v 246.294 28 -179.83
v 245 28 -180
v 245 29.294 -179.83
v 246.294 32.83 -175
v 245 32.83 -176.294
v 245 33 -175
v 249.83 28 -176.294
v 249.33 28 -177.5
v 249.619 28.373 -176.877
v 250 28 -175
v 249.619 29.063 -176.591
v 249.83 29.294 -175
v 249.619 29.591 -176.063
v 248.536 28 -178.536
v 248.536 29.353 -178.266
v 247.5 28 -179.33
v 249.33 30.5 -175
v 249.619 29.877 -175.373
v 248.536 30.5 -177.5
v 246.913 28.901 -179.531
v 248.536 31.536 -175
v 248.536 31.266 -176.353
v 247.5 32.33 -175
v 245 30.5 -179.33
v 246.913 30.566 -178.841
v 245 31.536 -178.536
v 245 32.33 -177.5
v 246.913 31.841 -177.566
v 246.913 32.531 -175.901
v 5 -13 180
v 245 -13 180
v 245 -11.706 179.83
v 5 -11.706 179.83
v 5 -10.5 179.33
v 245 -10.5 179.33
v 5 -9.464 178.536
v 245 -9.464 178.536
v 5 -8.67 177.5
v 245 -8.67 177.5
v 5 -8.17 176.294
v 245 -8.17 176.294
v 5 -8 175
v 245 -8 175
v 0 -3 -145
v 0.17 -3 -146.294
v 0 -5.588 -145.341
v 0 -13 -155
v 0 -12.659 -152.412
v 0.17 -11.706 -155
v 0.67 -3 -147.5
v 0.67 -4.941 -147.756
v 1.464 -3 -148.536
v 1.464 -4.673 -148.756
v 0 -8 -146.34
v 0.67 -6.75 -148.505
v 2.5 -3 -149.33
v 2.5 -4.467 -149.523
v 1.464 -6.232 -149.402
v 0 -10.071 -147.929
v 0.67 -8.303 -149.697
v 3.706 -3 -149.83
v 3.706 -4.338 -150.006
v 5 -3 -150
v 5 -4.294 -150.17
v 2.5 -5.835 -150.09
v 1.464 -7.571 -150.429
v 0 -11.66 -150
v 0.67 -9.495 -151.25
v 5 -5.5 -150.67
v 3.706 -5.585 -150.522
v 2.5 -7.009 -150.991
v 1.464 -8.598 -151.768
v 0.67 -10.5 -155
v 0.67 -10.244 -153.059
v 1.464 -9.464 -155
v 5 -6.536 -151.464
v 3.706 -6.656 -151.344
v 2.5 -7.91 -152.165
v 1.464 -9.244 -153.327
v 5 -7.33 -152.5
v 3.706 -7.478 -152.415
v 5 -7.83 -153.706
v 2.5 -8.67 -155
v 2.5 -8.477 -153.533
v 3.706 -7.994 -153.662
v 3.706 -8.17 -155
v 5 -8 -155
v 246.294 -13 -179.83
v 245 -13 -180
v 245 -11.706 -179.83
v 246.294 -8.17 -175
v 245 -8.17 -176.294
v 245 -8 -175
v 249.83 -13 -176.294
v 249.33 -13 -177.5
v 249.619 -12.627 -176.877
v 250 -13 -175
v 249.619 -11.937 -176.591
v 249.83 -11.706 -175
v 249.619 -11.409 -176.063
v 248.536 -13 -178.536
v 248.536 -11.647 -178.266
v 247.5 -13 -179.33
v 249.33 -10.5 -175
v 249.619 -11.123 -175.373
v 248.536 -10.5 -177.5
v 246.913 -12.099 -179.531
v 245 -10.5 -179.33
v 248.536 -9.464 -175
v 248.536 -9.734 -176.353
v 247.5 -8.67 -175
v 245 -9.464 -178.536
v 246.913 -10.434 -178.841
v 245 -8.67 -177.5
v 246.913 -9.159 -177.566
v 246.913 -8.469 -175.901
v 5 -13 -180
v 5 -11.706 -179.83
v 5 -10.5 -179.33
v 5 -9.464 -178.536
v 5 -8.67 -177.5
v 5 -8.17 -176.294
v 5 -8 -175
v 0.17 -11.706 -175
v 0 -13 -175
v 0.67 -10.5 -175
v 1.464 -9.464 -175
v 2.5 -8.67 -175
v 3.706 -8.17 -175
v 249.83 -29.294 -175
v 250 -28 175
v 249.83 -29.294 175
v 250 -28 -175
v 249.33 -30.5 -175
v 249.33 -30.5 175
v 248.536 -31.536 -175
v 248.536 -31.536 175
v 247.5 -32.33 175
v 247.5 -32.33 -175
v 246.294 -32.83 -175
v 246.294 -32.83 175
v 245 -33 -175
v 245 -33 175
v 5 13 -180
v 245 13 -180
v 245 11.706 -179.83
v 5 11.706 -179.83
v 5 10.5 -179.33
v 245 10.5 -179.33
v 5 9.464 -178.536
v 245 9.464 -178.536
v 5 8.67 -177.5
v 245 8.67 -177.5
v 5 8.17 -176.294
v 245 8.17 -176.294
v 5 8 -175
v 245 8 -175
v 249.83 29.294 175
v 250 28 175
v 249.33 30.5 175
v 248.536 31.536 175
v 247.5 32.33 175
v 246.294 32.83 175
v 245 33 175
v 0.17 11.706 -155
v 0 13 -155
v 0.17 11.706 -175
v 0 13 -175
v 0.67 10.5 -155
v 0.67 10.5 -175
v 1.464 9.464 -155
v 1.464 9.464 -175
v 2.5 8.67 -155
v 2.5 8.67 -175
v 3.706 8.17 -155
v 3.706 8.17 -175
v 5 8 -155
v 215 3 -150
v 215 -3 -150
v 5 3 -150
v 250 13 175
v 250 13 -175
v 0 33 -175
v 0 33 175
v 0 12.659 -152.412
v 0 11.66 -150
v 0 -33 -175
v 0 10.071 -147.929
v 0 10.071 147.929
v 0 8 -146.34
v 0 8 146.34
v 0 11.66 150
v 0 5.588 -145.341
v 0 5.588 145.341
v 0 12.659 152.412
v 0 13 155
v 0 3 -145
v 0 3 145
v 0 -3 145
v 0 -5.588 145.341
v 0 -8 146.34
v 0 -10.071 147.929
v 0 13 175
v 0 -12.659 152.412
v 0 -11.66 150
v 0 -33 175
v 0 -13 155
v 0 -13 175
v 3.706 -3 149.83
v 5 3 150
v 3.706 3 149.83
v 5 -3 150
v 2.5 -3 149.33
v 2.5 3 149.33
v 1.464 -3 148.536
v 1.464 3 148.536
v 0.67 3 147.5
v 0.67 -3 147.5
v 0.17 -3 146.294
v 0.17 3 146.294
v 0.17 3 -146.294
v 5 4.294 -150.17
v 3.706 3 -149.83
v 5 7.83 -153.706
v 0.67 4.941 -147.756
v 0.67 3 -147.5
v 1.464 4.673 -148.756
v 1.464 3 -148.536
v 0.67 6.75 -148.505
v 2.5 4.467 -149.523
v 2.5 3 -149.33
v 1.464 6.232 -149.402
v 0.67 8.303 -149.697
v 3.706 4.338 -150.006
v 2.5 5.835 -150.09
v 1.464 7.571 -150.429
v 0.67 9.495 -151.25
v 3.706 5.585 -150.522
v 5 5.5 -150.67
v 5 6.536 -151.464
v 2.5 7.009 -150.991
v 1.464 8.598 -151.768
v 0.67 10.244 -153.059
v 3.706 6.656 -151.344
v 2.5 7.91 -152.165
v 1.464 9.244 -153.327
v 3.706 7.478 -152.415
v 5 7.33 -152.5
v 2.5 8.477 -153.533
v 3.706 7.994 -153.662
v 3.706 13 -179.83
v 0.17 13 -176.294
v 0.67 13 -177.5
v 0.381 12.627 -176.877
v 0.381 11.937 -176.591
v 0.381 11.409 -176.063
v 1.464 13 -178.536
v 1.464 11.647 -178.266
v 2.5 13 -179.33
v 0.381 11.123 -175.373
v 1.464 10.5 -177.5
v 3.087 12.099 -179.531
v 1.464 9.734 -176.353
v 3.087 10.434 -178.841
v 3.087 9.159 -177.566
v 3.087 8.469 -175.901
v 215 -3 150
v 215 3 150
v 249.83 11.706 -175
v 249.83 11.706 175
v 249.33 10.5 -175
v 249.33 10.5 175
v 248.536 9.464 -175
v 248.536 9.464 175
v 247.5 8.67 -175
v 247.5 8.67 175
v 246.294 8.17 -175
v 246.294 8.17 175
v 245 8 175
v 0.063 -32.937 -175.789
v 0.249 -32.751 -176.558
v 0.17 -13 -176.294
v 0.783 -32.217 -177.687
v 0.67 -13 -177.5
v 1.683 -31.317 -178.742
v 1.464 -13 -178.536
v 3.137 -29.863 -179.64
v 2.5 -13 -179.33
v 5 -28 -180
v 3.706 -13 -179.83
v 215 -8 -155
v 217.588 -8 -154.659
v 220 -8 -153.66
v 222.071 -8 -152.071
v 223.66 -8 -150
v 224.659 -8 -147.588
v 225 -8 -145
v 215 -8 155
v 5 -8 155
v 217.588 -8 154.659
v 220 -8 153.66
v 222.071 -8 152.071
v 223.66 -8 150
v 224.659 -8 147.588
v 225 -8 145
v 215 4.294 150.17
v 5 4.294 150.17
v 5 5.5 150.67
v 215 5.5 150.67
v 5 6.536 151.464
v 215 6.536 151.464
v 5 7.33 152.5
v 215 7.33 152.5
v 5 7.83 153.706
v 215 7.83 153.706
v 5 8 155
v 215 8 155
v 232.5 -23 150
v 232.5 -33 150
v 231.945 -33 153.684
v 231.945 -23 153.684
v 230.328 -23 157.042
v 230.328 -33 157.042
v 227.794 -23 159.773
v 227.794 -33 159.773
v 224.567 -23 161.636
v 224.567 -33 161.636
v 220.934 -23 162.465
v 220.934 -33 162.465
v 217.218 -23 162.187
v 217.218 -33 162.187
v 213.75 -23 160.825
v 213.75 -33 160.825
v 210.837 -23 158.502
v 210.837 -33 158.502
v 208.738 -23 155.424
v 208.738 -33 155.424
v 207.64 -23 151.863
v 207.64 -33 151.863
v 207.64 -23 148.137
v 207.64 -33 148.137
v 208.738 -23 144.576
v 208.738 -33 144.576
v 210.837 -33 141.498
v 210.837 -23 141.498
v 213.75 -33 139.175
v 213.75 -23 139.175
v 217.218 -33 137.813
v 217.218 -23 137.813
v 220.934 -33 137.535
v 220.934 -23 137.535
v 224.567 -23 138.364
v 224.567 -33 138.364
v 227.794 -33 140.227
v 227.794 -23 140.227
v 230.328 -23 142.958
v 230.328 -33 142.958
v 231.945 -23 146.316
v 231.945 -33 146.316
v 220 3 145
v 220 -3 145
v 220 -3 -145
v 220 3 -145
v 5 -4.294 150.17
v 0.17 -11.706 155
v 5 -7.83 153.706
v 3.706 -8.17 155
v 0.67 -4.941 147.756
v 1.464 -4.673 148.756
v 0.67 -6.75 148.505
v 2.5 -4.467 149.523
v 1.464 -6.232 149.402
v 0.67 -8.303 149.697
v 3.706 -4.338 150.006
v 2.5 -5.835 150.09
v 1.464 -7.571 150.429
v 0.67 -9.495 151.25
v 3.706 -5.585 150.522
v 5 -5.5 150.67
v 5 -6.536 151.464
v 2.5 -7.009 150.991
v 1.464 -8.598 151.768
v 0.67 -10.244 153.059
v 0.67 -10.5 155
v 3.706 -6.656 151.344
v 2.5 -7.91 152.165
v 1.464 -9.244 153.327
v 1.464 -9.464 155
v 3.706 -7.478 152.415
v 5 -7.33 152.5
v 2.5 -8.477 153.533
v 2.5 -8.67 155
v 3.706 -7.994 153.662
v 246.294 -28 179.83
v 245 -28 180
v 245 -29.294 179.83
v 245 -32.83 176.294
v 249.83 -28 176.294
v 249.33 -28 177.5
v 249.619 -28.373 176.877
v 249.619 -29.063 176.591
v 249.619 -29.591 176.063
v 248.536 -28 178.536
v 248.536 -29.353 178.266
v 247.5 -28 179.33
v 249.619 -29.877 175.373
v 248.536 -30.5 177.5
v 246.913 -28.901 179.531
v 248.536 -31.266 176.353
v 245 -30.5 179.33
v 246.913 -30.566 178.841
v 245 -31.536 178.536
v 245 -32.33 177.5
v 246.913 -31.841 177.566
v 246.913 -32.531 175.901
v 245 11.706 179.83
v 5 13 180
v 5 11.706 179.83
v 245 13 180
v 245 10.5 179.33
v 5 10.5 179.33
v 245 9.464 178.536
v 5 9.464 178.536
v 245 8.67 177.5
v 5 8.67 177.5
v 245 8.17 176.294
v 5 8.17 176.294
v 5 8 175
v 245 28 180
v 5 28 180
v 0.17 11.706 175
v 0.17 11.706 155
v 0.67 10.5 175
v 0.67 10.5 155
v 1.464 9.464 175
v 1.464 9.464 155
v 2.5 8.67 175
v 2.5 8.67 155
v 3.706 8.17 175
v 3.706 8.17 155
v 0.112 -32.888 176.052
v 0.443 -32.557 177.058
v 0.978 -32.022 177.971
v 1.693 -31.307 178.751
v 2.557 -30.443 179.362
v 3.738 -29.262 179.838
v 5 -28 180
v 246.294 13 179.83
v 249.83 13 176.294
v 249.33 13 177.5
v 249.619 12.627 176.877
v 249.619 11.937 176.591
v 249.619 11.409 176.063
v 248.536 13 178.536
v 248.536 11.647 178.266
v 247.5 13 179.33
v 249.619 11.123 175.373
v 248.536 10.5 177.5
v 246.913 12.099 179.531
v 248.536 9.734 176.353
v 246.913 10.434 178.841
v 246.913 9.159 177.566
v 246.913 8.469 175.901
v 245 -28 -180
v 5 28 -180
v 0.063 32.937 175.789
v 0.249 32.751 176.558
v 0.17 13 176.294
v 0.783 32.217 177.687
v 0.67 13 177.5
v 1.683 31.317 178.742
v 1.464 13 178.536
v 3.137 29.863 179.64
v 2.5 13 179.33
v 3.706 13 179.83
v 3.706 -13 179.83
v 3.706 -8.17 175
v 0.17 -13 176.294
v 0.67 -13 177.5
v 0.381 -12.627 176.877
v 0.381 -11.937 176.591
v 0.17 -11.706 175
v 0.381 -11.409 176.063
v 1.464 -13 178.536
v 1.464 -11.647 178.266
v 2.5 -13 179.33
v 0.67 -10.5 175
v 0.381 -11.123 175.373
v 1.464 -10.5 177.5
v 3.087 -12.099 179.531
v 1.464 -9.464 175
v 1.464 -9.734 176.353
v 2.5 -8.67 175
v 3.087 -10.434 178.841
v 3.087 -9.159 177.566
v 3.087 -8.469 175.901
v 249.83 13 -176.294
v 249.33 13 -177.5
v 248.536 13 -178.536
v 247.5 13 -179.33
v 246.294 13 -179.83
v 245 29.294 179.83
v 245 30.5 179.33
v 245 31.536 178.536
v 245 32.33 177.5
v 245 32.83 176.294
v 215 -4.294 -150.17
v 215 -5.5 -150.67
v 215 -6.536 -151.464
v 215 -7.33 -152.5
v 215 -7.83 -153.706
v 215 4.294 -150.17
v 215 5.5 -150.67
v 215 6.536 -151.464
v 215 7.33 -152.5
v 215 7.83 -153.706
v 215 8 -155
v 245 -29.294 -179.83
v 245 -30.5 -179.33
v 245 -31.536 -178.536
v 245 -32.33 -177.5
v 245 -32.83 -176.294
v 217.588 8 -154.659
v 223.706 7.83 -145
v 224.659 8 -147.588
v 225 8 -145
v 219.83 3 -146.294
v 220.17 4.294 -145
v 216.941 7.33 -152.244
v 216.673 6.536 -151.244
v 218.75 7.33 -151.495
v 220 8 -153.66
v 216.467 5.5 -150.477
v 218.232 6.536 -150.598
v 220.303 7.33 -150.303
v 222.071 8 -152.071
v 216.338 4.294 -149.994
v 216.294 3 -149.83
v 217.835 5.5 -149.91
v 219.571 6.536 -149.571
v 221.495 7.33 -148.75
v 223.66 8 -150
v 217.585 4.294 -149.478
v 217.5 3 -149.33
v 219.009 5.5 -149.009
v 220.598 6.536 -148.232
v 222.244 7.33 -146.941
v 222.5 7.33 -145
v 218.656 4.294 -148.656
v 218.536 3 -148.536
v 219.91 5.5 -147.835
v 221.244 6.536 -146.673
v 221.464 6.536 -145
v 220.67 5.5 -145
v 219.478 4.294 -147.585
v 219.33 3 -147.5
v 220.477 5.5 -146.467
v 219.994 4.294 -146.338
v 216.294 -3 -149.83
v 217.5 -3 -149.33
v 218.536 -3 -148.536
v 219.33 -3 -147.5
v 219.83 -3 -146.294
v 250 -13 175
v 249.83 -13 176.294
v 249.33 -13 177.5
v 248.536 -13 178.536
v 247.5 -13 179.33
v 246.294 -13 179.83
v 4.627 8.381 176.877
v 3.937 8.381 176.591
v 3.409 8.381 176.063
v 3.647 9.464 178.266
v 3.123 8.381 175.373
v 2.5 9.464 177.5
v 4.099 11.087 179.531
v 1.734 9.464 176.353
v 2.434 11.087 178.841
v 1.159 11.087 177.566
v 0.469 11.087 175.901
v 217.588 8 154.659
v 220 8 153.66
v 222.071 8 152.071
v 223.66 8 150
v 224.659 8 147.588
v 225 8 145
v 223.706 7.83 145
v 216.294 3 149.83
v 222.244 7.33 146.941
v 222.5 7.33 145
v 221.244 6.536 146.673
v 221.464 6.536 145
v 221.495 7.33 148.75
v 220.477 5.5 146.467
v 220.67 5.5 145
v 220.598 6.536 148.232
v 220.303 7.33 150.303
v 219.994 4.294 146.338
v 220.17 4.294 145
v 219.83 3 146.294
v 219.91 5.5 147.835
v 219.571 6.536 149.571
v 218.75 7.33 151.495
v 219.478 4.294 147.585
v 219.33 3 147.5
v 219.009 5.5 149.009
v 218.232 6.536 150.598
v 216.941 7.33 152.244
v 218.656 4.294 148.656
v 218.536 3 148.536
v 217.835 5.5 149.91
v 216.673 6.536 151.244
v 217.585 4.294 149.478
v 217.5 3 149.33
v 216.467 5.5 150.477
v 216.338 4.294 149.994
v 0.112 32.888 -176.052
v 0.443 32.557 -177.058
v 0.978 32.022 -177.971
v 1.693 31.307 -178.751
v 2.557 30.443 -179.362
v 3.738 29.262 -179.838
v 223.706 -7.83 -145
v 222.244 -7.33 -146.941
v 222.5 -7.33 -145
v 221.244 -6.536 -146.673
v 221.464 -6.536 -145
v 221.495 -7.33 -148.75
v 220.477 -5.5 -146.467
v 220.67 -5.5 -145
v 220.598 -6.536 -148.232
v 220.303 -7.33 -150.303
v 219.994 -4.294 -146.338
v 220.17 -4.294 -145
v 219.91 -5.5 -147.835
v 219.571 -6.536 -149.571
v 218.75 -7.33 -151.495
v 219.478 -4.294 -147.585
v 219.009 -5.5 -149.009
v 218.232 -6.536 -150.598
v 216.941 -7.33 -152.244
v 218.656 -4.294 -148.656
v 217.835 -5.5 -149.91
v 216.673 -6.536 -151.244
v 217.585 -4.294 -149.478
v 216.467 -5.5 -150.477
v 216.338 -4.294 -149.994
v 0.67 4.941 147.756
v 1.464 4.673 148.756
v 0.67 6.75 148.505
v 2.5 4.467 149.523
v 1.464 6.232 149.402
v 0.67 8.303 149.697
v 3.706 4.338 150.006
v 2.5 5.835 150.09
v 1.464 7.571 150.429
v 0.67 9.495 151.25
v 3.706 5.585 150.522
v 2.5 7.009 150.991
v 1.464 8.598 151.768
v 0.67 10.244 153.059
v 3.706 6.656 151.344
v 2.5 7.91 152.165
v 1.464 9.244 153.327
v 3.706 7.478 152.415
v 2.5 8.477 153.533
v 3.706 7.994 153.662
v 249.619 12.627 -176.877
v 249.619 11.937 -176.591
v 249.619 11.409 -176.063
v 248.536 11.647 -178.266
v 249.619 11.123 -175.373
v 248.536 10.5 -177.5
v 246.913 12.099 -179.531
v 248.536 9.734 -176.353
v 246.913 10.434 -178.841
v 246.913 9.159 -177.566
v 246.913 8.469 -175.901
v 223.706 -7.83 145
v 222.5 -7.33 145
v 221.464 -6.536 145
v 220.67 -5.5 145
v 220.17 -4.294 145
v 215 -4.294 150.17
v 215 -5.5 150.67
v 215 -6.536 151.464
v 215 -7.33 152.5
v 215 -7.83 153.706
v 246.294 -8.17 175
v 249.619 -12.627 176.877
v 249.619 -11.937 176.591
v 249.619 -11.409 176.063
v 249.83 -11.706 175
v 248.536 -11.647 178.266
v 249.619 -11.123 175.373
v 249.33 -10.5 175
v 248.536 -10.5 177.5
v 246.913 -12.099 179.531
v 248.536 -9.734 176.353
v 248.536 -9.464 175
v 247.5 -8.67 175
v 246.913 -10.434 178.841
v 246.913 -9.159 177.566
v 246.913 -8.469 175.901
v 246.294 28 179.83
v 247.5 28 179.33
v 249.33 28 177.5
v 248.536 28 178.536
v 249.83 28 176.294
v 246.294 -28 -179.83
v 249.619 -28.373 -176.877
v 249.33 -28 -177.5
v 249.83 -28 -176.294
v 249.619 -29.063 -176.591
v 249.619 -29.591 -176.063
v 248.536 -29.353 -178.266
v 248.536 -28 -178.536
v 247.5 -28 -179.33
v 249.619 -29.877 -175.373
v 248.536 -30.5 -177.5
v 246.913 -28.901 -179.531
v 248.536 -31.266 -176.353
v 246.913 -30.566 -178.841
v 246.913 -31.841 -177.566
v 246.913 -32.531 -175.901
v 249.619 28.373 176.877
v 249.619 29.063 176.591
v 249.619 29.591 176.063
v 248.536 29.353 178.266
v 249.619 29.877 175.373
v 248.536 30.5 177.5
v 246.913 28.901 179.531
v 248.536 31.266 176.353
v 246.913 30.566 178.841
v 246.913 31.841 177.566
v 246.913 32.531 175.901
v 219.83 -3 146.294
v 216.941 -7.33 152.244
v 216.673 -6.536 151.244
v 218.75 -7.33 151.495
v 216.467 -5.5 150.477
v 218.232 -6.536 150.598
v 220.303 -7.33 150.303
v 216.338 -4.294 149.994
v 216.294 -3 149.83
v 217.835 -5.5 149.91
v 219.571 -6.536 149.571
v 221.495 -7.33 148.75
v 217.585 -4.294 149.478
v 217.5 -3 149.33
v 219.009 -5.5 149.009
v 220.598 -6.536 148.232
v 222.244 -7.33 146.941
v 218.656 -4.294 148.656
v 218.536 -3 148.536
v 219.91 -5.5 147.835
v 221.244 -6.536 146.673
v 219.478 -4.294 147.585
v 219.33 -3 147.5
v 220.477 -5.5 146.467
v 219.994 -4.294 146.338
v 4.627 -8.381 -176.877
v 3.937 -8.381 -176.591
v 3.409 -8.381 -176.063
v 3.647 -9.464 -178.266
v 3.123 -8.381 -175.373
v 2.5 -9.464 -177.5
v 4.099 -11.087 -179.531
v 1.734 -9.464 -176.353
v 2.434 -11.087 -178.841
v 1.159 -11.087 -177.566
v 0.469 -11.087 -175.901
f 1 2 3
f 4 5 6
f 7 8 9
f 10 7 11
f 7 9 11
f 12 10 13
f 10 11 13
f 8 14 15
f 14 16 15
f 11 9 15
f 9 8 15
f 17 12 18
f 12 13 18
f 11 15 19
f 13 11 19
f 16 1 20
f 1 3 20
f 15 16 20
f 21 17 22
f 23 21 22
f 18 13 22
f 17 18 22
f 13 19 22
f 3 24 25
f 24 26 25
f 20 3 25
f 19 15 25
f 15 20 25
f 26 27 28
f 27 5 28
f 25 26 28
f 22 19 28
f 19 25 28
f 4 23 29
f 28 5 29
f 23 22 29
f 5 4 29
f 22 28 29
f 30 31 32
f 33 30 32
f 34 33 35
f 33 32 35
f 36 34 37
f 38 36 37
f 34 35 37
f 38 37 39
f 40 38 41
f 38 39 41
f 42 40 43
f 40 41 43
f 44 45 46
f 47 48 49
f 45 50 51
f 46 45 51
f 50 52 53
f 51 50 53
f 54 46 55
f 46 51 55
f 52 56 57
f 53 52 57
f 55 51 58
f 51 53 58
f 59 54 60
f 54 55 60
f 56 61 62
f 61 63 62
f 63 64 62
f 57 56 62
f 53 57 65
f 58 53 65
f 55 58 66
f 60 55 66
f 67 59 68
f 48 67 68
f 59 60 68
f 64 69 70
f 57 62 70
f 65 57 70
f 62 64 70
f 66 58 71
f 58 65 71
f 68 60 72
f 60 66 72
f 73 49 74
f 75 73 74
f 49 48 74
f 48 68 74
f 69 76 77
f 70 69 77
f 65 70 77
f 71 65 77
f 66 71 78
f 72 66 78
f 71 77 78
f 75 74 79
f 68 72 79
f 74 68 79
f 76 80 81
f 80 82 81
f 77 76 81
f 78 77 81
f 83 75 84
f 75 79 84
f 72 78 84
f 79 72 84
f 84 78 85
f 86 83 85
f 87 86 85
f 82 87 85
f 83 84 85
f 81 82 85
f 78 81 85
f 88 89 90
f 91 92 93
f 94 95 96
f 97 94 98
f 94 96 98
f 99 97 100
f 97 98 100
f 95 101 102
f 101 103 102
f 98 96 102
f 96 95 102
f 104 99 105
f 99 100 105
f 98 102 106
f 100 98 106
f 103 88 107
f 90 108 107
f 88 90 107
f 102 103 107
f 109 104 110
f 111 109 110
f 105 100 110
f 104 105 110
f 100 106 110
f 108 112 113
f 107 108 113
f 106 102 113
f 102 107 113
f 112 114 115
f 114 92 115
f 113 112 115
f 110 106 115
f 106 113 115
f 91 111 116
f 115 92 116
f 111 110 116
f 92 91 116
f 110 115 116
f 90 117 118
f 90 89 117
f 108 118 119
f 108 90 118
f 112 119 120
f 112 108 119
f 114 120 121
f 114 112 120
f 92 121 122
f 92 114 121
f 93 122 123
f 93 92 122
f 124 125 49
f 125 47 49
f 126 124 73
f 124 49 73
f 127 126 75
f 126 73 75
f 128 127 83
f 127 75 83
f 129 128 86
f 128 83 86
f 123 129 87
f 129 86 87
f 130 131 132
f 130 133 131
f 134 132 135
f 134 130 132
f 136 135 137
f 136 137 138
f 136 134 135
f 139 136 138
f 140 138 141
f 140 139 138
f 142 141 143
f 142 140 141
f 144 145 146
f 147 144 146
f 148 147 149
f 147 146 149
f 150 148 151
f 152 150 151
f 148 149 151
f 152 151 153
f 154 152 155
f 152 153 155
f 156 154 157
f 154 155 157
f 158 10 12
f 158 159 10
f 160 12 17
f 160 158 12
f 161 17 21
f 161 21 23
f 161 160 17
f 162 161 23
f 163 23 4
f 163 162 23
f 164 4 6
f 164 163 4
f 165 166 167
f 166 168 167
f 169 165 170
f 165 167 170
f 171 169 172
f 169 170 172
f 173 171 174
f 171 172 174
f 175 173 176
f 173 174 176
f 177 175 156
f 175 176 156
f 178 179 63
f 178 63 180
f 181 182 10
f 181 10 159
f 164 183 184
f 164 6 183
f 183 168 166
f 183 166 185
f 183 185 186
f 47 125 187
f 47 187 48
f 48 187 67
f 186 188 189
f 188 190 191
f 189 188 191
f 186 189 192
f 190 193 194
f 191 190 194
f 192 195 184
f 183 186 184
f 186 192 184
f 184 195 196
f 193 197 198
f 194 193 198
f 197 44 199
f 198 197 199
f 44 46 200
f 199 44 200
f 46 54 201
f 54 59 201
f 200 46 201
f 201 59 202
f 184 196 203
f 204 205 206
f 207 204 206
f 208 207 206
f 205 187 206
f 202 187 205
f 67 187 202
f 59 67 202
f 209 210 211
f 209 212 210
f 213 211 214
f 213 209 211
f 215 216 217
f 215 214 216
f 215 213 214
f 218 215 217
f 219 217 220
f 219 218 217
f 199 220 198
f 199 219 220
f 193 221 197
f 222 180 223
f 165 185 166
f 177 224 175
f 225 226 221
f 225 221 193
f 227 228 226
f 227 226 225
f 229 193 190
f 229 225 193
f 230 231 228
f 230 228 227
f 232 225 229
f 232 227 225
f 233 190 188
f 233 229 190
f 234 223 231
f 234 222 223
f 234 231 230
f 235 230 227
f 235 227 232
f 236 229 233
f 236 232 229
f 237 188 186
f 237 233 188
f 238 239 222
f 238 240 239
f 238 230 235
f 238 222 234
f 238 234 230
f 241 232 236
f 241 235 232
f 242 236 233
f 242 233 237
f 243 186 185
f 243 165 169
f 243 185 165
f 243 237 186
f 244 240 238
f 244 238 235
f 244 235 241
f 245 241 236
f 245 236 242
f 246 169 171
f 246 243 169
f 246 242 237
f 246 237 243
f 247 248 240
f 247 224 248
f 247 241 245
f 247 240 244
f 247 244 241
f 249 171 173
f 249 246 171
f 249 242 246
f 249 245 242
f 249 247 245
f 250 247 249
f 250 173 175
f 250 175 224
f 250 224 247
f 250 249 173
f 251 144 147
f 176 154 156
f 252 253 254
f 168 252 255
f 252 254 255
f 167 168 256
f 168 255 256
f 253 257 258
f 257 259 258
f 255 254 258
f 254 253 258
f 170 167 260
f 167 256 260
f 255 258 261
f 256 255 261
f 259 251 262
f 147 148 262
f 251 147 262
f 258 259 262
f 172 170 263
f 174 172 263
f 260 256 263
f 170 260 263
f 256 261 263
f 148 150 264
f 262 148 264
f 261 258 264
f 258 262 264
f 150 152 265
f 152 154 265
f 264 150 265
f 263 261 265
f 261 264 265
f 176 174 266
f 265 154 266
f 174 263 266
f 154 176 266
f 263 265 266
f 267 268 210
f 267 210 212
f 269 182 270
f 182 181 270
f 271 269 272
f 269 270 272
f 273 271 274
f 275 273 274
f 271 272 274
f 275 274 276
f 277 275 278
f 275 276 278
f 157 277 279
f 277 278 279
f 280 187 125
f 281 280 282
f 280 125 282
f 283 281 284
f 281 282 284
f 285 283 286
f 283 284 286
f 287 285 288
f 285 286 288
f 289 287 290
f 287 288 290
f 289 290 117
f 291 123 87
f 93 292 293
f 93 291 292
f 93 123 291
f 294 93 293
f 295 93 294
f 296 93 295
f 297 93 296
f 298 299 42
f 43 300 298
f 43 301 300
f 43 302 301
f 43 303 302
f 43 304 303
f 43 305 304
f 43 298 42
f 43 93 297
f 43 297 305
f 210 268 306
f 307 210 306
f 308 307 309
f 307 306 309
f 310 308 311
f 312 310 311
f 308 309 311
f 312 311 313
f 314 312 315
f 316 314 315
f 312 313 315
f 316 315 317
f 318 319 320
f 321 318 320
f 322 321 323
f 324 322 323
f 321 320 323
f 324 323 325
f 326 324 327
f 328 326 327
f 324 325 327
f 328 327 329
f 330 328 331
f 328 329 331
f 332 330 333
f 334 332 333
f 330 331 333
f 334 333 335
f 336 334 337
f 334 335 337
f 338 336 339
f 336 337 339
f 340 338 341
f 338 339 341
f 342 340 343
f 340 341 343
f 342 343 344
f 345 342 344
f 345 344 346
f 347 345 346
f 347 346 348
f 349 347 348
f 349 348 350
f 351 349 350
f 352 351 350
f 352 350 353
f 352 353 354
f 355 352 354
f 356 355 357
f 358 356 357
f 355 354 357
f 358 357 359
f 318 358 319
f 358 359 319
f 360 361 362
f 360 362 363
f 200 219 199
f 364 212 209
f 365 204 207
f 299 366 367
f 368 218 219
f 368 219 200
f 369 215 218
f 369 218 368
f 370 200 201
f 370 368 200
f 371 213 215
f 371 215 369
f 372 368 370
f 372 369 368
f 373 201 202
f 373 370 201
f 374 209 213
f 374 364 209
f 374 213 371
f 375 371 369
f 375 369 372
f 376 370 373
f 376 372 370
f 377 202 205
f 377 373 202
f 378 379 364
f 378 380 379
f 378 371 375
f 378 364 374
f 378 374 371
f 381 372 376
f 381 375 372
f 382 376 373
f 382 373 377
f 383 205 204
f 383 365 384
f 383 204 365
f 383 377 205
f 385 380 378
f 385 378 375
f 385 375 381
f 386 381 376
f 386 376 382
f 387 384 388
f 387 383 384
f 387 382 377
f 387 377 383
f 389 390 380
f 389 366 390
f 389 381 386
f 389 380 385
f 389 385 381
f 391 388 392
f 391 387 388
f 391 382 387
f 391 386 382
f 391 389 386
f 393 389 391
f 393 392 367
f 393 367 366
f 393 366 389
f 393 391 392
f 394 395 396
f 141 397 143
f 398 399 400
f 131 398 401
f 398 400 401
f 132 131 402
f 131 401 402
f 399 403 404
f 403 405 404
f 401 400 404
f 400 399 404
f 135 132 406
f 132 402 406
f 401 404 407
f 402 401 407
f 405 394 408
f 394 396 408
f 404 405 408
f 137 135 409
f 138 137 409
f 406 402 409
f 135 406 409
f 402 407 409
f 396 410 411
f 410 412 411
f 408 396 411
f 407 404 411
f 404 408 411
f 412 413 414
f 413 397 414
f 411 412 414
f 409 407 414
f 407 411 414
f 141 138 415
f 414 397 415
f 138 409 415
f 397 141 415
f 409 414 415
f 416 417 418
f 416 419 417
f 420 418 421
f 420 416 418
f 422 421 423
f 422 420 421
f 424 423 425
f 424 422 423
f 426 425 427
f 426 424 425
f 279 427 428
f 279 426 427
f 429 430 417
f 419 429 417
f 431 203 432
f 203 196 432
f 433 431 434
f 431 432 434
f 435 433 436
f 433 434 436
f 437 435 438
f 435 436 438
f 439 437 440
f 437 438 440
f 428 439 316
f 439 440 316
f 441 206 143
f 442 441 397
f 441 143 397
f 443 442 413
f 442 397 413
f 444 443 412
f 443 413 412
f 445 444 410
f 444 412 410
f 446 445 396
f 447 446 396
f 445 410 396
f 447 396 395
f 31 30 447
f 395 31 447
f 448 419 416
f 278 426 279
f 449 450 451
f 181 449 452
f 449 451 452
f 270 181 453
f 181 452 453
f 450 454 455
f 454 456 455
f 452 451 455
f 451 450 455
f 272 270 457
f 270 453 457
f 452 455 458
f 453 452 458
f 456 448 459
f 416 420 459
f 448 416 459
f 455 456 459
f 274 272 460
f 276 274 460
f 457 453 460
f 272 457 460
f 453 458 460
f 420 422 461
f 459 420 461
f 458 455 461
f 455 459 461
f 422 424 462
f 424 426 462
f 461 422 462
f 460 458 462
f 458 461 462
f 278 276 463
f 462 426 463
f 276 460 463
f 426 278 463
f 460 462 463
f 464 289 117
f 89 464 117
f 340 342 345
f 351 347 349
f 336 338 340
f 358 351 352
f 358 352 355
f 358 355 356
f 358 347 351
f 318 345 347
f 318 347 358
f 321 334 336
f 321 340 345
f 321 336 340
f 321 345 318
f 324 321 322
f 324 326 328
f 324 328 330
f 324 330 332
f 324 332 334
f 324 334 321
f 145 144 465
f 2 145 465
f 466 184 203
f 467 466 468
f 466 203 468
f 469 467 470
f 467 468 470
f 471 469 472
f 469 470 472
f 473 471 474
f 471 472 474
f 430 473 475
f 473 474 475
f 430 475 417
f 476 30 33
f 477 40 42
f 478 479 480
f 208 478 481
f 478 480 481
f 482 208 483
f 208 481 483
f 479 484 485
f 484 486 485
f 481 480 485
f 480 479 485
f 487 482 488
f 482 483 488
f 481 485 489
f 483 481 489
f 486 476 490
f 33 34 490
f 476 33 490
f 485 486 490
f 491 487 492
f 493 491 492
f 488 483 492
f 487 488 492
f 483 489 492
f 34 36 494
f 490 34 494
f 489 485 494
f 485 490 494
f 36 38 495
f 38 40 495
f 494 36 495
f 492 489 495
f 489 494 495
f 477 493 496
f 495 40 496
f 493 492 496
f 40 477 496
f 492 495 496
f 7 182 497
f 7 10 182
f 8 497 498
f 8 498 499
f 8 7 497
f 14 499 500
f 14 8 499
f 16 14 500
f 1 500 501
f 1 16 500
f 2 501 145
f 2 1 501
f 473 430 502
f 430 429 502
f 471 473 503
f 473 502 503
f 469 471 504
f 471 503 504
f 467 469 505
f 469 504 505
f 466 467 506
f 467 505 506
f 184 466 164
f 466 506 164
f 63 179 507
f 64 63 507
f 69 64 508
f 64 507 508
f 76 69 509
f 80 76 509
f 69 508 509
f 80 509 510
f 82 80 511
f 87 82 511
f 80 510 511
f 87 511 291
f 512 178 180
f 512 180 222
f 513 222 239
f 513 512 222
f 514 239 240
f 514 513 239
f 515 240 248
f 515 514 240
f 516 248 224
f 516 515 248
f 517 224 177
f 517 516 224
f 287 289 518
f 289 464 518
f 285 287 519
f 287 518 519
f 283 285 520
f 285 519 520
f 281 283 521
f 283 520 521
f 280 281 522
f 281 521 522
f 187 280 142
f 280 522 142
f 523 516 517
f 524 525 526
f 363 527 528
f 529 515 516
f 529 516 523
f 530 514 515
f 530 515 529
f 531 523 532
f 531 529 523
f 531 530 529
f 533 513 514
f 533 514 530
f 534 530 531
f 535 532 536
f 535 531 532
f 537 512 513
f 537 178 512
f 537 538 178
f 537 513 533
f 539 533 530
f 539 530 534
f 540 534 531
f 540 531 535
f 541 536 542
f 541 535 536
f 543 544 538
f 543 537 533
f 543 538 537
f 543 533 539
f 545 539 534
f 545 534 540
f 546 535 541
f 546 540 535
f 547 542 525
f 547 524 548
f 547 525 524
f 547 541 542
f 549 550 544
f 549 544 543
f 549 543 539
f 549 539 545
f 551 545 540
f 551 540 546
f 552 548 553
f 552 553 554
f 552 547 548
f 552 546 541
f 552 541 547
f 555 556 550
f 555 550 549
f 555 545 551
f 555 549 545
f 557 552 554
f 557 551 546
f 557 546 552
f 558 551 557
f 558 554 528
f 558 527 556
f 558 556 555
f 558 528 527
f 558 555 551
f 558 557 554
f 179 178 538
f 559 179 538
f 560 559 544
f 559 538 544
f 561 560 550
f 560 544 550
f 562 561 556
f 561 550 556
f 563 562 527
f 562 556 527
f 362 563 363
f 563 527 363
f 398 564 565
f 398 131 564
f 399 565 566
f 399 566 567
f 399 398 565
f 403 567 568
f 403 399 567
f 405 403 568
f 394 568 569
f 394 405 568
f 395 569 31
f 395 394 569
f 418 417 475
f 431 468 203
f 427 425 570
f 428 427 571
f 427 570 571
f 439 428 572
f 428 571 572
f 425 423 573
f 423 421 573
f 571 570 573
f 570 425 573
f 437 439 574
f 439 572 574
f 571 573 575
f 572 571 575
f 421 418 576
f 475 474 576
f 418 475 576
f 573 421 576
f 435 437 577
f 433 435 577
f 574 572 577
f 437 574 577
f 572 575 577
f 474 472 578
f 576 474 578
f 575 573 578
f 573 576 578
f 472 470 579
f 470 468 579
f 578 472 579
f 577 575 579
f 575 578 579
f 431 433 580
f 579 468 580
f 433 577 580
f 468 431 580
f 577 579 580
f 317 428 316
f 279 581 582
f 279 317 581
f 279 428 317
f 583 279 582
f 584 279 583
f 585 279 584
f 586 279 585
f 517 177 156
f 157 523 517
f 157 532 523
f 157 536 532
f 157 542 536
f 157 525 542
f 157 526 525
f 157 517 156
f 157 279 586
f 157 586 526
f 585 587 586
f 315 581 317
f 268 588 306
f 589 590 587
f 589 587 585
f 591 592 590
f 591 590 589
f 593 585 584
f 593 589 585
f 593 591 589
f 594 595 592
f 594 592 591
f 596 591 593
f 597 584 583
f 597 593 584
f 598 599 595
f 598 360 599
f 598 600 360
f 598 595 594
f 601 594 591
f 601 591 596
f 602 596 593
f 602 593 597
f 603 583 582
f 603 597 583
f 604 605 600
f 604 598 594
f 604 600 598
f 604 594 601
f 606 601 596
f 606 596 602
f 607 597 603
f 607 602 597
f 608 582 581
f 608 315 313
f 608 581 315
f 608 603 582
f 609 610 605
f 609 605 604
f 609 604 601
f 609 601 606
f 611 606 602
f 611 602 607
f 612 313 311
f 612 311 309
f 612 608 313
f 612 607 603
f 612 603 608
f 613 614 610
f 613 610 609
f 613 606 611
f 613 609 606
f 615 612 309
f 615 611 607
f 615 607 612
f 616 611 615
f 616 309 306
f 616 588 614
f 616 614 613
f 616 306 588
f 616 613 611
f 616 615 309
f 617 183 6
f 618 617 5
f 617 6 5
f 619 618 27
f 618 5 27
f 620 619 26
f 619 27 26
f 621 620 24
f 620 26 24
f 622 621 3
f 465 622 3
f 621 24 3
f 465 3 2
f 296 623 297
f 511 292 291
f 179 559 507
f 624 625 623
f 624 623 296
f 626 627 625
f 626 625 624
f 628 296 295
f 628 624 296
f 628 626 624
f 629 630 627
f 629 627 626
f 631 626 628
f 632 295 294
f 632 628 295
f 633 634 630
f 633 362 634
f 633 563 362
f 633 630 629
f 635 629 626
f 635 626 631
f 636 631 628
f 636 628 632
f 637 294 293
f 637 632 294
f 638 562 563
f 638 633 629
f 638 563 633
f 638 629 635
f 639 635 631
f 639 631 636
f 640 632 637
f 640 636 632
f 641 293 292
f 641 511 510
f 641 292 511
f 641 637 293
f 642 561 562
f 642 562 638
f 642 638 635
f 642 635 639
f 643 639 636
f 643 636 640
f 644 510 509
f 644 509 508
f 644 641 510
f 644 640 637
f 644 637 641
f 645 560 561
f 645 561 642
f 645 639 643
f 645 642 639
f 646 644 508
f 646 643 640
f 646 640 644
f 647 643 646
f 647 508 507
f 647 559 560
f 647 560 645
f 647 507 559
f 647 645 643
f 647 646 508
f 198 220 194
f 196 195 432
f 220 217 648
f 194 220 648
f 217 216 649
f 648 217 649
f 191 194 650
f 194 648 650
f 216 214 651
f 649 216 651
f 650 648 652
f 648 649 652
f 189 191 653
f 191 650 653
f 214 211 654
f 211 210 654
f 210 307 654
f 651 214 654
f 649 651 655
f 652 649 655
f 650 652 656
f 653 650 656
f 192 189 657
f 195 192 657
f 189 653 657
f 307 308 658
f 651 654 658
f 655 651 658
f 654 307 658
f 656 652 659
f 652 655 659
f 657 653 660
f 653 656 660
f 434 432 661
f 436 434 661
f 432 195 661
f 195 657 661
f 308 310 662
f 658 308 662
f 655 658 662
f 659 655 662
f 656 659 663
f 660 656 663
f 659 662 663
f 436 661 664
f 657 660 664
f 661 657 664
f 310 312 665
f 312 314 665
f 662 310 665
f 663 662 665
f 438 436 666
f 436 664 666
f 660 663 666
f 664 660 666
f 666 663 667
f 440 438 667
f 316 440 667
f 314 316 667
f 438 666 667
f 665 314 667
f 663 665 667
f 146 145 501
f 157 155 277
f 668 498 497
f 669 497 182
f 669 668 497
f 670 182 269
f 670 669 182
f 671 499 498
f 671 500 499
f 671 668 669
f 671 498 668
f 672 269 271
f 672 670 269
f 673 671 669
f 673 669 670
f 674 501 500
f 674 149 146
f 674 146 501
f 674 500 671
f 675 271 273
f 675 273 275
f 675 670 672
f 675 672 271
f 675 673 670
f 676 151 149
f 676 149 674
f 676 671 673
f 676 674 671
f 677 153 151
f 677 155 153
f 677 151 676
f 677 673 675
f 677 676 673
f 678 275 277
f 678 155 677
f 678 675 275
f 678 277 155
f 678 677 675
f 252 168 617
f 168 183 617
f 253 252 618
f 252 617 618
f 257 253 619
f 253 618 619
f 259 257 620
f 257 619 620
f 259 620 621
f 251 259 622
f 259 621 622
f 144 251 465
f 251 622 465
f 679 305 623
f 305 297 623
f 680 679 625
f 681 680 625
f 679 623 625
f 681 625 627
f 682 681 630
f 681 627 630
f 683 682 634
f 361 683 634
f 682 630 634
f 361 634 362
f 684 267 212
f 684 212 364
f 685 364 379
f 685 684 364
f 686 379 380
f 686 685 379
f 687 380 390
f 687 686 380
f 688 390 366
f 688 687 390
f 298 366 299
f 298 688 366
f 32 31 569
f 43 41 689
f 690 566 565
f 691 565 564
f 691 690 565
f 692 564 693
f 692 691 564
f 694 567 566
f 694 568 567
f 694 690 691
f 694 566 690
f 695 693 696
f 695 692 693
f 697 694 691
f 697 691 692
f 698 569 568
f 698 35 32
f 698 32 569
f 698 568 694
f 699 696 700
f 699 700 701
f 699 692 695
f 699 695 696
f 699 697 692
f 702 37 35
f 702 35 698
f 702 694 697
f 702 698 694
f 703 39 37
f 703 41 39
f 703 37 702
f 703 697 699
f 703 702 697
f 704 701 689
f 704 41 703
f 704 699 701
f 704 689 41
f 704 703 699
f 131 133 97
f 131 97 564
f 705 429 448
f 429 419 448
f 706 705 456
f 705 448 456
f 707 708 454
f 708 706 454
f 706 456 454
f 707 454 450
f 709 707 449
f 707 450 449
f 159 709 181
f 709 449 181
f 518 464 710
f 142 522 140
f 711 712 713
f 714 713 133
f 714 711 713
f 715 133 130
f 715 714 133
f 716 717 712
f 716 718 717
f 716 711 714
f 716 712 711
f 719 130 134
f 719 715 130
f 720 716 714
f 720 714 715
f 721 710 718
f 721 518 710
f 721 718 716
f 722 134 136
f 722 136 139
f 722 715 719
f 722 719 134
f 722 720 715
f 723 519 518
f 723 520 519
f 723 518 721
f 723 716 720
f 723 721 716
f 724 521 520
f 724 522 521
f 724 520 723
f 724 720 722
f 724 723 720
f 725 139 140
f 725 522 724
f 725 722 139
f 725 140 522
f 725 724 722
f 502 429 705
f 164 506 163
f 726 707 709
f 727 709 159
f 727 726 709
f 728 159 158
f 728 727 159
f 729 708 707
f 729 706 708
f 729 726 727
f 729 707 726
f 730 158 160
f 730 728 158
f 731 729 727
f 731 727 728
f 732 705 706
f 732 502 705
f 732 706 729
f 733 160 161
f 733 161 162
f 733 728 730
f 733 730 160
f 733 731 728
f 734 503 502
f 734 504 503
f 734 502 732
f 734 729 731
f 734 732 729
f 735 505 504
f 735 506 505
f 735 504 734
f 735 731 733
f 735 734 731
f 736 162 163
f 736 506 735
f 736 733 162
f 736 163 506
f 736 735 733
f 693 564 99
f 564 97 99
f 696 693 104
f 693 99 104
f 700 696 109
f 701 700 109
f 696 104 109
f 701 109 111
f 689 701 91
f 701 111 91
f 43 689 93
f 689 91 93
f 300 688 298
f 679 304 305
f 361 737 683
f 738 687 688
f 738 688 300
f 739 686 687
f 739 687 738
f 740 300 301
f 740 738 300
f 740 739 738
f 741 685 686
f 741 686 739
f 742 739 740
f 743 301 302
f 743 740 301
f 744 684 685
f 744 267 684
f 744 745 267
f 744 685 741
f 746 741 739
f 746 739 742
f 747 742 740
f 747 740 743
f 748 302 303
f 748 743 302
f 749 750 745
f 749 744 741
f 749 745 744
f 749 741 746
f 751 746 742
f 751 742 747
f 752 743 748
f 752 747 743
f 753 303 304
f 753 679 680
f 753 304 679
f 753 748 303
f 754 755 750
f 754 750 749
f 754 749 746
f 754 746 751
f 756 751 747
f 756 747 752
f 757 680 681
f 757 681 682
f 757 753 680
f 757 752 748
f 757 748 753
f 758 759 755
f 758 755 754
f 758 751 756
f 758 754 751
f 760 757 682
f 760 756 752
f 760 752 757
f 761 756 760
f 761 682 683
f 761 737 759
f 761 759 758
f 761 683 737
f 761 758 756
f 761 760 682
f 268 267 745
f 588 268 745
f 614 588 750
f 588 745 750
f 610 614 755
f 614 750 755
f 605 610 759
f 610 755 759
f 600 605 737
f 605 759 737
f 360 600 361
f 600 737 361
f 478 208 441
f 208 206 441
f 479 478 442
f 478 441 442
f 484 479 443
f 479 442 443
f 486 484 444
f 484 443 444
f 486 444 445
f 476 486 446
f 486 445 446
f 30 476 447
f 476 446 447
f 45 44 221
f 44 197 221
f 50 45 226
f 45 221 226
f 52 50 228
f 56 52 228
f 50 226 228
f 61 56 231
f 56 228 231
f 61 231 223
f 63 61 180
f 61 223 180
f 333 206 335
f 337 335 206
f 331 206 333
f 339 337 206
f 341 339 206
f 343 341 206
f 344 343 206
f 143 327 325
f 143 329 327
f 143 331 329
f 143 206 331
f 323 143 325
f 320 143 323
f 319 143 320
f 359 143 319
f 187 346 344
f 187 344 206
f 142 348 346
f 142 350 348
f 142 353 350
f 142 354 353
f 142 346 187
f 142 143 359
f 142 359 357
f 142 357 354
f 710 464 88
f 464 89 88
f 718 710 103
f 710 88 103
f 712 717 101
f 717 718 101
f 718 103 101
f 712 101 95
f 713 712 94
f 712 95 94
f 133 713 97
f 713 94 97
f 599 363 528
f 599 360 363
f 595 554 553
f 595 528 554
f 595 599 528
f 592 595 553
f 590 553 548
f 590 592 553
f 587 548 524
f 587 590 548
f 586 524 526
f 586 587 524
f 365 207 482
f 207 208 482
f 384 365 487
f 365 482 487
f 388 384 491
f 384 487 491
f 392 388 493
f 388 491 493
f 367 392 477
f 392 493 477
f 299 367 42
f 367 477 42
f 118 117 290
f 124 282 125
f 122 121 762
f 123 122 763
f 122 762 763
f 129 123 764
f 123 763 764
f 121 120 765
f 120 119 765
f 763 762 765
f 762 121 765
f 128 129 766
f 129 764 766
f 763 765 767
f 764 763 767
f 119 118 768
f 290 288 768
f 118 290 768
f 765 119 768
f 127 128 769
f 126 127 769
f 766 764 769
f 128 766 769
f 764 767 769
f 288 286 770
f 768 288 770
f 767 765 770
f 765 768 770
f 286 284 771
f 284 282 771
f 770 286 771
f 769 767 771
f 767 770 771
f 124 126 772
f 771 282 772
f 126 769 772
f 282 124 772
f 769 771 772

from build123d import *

# Parameters (mm, degrees)
F3_R     = 12.5
F4_DEPTH = 10
F6_DEPTH = 30
F7_R     = 5


with BuildPart() as f2:
    # F2: sweep along a path in F1
    with BuildLine(Plane.XZ) as f2_path:
        Line((0, 0), (250, 0))
    # F0 (on Right) → F2 (sweep)
    with BuildSketch(Plane.YZ):
        Polygon((8, 150), (0, 150), (-8, 150), (-8, 180), (-33, 180), (-33, -180), (-8, -180), (-8, -150), (0, -150), (8, -150), (8, -180), (33, -180), (33, 180), (8, 180), align=None)
    sweep(path=f2_path.line)

    # F3 (on face) → F4 (cut)
    with BuildSketch(Plane.XZ.offset(33)):
        with Locations((220, 150)):
            Circle(F3_R)
    extrude(amount=-F4_DEPTH, mode=Mode.SUBTRACT)

    # F5 (on face) → F6 (cut)
    with BuildSketch(Plane.YZ.offset(250)):
        Polygon((8, 150), (0, 150), (-8, 150), (-8, -150), (0, -150), (8, -150), align=None)
    extrude(amount=-F6_DEPTH, mode=Mode.SUBTRACT)

    # F7
    f7_edges = [f2.edges().sort_by_distance(p)[0] for p in [
        (110, 8, 150),
        (220, 0, 150),
        (110, -8, 150),
        (0, 0, 150),
        (110, -8, -150),
        (220, 0, -150),
        (110, 8, -150),
        (0, 0, -150),
        (125, 33, 180),
        (0, 20.5, 180),
        (125, 8, 180),
        (250, 20.5, 180),
        (125, -8, 180),
        (0, -20.5, 180),
        (125, -33, 180),
        (250, -20.5, 180),
        (125, 8, -180),
        (0, 20.5, -180),
        (125, 33, -180),
        (250, 20.5, -180),
        (125, -33, -180),
        (0, -20.5, -180),
        (125, -8, -180),
        (250, -20.5, -180),
        (0, -8, 165),
        (0, -8, -165),
        (0, 8, -165),
        (0, 8, 165),
        (250, 8, 0),
        (250, 33, 0),
        (250, -8, 0),
        (250, -33, 0),
        (220, -8, 0),
        (220, 8, 0),
    ]]
    fillet(f7_edges, radius=F7_R)


solid = f2.part
